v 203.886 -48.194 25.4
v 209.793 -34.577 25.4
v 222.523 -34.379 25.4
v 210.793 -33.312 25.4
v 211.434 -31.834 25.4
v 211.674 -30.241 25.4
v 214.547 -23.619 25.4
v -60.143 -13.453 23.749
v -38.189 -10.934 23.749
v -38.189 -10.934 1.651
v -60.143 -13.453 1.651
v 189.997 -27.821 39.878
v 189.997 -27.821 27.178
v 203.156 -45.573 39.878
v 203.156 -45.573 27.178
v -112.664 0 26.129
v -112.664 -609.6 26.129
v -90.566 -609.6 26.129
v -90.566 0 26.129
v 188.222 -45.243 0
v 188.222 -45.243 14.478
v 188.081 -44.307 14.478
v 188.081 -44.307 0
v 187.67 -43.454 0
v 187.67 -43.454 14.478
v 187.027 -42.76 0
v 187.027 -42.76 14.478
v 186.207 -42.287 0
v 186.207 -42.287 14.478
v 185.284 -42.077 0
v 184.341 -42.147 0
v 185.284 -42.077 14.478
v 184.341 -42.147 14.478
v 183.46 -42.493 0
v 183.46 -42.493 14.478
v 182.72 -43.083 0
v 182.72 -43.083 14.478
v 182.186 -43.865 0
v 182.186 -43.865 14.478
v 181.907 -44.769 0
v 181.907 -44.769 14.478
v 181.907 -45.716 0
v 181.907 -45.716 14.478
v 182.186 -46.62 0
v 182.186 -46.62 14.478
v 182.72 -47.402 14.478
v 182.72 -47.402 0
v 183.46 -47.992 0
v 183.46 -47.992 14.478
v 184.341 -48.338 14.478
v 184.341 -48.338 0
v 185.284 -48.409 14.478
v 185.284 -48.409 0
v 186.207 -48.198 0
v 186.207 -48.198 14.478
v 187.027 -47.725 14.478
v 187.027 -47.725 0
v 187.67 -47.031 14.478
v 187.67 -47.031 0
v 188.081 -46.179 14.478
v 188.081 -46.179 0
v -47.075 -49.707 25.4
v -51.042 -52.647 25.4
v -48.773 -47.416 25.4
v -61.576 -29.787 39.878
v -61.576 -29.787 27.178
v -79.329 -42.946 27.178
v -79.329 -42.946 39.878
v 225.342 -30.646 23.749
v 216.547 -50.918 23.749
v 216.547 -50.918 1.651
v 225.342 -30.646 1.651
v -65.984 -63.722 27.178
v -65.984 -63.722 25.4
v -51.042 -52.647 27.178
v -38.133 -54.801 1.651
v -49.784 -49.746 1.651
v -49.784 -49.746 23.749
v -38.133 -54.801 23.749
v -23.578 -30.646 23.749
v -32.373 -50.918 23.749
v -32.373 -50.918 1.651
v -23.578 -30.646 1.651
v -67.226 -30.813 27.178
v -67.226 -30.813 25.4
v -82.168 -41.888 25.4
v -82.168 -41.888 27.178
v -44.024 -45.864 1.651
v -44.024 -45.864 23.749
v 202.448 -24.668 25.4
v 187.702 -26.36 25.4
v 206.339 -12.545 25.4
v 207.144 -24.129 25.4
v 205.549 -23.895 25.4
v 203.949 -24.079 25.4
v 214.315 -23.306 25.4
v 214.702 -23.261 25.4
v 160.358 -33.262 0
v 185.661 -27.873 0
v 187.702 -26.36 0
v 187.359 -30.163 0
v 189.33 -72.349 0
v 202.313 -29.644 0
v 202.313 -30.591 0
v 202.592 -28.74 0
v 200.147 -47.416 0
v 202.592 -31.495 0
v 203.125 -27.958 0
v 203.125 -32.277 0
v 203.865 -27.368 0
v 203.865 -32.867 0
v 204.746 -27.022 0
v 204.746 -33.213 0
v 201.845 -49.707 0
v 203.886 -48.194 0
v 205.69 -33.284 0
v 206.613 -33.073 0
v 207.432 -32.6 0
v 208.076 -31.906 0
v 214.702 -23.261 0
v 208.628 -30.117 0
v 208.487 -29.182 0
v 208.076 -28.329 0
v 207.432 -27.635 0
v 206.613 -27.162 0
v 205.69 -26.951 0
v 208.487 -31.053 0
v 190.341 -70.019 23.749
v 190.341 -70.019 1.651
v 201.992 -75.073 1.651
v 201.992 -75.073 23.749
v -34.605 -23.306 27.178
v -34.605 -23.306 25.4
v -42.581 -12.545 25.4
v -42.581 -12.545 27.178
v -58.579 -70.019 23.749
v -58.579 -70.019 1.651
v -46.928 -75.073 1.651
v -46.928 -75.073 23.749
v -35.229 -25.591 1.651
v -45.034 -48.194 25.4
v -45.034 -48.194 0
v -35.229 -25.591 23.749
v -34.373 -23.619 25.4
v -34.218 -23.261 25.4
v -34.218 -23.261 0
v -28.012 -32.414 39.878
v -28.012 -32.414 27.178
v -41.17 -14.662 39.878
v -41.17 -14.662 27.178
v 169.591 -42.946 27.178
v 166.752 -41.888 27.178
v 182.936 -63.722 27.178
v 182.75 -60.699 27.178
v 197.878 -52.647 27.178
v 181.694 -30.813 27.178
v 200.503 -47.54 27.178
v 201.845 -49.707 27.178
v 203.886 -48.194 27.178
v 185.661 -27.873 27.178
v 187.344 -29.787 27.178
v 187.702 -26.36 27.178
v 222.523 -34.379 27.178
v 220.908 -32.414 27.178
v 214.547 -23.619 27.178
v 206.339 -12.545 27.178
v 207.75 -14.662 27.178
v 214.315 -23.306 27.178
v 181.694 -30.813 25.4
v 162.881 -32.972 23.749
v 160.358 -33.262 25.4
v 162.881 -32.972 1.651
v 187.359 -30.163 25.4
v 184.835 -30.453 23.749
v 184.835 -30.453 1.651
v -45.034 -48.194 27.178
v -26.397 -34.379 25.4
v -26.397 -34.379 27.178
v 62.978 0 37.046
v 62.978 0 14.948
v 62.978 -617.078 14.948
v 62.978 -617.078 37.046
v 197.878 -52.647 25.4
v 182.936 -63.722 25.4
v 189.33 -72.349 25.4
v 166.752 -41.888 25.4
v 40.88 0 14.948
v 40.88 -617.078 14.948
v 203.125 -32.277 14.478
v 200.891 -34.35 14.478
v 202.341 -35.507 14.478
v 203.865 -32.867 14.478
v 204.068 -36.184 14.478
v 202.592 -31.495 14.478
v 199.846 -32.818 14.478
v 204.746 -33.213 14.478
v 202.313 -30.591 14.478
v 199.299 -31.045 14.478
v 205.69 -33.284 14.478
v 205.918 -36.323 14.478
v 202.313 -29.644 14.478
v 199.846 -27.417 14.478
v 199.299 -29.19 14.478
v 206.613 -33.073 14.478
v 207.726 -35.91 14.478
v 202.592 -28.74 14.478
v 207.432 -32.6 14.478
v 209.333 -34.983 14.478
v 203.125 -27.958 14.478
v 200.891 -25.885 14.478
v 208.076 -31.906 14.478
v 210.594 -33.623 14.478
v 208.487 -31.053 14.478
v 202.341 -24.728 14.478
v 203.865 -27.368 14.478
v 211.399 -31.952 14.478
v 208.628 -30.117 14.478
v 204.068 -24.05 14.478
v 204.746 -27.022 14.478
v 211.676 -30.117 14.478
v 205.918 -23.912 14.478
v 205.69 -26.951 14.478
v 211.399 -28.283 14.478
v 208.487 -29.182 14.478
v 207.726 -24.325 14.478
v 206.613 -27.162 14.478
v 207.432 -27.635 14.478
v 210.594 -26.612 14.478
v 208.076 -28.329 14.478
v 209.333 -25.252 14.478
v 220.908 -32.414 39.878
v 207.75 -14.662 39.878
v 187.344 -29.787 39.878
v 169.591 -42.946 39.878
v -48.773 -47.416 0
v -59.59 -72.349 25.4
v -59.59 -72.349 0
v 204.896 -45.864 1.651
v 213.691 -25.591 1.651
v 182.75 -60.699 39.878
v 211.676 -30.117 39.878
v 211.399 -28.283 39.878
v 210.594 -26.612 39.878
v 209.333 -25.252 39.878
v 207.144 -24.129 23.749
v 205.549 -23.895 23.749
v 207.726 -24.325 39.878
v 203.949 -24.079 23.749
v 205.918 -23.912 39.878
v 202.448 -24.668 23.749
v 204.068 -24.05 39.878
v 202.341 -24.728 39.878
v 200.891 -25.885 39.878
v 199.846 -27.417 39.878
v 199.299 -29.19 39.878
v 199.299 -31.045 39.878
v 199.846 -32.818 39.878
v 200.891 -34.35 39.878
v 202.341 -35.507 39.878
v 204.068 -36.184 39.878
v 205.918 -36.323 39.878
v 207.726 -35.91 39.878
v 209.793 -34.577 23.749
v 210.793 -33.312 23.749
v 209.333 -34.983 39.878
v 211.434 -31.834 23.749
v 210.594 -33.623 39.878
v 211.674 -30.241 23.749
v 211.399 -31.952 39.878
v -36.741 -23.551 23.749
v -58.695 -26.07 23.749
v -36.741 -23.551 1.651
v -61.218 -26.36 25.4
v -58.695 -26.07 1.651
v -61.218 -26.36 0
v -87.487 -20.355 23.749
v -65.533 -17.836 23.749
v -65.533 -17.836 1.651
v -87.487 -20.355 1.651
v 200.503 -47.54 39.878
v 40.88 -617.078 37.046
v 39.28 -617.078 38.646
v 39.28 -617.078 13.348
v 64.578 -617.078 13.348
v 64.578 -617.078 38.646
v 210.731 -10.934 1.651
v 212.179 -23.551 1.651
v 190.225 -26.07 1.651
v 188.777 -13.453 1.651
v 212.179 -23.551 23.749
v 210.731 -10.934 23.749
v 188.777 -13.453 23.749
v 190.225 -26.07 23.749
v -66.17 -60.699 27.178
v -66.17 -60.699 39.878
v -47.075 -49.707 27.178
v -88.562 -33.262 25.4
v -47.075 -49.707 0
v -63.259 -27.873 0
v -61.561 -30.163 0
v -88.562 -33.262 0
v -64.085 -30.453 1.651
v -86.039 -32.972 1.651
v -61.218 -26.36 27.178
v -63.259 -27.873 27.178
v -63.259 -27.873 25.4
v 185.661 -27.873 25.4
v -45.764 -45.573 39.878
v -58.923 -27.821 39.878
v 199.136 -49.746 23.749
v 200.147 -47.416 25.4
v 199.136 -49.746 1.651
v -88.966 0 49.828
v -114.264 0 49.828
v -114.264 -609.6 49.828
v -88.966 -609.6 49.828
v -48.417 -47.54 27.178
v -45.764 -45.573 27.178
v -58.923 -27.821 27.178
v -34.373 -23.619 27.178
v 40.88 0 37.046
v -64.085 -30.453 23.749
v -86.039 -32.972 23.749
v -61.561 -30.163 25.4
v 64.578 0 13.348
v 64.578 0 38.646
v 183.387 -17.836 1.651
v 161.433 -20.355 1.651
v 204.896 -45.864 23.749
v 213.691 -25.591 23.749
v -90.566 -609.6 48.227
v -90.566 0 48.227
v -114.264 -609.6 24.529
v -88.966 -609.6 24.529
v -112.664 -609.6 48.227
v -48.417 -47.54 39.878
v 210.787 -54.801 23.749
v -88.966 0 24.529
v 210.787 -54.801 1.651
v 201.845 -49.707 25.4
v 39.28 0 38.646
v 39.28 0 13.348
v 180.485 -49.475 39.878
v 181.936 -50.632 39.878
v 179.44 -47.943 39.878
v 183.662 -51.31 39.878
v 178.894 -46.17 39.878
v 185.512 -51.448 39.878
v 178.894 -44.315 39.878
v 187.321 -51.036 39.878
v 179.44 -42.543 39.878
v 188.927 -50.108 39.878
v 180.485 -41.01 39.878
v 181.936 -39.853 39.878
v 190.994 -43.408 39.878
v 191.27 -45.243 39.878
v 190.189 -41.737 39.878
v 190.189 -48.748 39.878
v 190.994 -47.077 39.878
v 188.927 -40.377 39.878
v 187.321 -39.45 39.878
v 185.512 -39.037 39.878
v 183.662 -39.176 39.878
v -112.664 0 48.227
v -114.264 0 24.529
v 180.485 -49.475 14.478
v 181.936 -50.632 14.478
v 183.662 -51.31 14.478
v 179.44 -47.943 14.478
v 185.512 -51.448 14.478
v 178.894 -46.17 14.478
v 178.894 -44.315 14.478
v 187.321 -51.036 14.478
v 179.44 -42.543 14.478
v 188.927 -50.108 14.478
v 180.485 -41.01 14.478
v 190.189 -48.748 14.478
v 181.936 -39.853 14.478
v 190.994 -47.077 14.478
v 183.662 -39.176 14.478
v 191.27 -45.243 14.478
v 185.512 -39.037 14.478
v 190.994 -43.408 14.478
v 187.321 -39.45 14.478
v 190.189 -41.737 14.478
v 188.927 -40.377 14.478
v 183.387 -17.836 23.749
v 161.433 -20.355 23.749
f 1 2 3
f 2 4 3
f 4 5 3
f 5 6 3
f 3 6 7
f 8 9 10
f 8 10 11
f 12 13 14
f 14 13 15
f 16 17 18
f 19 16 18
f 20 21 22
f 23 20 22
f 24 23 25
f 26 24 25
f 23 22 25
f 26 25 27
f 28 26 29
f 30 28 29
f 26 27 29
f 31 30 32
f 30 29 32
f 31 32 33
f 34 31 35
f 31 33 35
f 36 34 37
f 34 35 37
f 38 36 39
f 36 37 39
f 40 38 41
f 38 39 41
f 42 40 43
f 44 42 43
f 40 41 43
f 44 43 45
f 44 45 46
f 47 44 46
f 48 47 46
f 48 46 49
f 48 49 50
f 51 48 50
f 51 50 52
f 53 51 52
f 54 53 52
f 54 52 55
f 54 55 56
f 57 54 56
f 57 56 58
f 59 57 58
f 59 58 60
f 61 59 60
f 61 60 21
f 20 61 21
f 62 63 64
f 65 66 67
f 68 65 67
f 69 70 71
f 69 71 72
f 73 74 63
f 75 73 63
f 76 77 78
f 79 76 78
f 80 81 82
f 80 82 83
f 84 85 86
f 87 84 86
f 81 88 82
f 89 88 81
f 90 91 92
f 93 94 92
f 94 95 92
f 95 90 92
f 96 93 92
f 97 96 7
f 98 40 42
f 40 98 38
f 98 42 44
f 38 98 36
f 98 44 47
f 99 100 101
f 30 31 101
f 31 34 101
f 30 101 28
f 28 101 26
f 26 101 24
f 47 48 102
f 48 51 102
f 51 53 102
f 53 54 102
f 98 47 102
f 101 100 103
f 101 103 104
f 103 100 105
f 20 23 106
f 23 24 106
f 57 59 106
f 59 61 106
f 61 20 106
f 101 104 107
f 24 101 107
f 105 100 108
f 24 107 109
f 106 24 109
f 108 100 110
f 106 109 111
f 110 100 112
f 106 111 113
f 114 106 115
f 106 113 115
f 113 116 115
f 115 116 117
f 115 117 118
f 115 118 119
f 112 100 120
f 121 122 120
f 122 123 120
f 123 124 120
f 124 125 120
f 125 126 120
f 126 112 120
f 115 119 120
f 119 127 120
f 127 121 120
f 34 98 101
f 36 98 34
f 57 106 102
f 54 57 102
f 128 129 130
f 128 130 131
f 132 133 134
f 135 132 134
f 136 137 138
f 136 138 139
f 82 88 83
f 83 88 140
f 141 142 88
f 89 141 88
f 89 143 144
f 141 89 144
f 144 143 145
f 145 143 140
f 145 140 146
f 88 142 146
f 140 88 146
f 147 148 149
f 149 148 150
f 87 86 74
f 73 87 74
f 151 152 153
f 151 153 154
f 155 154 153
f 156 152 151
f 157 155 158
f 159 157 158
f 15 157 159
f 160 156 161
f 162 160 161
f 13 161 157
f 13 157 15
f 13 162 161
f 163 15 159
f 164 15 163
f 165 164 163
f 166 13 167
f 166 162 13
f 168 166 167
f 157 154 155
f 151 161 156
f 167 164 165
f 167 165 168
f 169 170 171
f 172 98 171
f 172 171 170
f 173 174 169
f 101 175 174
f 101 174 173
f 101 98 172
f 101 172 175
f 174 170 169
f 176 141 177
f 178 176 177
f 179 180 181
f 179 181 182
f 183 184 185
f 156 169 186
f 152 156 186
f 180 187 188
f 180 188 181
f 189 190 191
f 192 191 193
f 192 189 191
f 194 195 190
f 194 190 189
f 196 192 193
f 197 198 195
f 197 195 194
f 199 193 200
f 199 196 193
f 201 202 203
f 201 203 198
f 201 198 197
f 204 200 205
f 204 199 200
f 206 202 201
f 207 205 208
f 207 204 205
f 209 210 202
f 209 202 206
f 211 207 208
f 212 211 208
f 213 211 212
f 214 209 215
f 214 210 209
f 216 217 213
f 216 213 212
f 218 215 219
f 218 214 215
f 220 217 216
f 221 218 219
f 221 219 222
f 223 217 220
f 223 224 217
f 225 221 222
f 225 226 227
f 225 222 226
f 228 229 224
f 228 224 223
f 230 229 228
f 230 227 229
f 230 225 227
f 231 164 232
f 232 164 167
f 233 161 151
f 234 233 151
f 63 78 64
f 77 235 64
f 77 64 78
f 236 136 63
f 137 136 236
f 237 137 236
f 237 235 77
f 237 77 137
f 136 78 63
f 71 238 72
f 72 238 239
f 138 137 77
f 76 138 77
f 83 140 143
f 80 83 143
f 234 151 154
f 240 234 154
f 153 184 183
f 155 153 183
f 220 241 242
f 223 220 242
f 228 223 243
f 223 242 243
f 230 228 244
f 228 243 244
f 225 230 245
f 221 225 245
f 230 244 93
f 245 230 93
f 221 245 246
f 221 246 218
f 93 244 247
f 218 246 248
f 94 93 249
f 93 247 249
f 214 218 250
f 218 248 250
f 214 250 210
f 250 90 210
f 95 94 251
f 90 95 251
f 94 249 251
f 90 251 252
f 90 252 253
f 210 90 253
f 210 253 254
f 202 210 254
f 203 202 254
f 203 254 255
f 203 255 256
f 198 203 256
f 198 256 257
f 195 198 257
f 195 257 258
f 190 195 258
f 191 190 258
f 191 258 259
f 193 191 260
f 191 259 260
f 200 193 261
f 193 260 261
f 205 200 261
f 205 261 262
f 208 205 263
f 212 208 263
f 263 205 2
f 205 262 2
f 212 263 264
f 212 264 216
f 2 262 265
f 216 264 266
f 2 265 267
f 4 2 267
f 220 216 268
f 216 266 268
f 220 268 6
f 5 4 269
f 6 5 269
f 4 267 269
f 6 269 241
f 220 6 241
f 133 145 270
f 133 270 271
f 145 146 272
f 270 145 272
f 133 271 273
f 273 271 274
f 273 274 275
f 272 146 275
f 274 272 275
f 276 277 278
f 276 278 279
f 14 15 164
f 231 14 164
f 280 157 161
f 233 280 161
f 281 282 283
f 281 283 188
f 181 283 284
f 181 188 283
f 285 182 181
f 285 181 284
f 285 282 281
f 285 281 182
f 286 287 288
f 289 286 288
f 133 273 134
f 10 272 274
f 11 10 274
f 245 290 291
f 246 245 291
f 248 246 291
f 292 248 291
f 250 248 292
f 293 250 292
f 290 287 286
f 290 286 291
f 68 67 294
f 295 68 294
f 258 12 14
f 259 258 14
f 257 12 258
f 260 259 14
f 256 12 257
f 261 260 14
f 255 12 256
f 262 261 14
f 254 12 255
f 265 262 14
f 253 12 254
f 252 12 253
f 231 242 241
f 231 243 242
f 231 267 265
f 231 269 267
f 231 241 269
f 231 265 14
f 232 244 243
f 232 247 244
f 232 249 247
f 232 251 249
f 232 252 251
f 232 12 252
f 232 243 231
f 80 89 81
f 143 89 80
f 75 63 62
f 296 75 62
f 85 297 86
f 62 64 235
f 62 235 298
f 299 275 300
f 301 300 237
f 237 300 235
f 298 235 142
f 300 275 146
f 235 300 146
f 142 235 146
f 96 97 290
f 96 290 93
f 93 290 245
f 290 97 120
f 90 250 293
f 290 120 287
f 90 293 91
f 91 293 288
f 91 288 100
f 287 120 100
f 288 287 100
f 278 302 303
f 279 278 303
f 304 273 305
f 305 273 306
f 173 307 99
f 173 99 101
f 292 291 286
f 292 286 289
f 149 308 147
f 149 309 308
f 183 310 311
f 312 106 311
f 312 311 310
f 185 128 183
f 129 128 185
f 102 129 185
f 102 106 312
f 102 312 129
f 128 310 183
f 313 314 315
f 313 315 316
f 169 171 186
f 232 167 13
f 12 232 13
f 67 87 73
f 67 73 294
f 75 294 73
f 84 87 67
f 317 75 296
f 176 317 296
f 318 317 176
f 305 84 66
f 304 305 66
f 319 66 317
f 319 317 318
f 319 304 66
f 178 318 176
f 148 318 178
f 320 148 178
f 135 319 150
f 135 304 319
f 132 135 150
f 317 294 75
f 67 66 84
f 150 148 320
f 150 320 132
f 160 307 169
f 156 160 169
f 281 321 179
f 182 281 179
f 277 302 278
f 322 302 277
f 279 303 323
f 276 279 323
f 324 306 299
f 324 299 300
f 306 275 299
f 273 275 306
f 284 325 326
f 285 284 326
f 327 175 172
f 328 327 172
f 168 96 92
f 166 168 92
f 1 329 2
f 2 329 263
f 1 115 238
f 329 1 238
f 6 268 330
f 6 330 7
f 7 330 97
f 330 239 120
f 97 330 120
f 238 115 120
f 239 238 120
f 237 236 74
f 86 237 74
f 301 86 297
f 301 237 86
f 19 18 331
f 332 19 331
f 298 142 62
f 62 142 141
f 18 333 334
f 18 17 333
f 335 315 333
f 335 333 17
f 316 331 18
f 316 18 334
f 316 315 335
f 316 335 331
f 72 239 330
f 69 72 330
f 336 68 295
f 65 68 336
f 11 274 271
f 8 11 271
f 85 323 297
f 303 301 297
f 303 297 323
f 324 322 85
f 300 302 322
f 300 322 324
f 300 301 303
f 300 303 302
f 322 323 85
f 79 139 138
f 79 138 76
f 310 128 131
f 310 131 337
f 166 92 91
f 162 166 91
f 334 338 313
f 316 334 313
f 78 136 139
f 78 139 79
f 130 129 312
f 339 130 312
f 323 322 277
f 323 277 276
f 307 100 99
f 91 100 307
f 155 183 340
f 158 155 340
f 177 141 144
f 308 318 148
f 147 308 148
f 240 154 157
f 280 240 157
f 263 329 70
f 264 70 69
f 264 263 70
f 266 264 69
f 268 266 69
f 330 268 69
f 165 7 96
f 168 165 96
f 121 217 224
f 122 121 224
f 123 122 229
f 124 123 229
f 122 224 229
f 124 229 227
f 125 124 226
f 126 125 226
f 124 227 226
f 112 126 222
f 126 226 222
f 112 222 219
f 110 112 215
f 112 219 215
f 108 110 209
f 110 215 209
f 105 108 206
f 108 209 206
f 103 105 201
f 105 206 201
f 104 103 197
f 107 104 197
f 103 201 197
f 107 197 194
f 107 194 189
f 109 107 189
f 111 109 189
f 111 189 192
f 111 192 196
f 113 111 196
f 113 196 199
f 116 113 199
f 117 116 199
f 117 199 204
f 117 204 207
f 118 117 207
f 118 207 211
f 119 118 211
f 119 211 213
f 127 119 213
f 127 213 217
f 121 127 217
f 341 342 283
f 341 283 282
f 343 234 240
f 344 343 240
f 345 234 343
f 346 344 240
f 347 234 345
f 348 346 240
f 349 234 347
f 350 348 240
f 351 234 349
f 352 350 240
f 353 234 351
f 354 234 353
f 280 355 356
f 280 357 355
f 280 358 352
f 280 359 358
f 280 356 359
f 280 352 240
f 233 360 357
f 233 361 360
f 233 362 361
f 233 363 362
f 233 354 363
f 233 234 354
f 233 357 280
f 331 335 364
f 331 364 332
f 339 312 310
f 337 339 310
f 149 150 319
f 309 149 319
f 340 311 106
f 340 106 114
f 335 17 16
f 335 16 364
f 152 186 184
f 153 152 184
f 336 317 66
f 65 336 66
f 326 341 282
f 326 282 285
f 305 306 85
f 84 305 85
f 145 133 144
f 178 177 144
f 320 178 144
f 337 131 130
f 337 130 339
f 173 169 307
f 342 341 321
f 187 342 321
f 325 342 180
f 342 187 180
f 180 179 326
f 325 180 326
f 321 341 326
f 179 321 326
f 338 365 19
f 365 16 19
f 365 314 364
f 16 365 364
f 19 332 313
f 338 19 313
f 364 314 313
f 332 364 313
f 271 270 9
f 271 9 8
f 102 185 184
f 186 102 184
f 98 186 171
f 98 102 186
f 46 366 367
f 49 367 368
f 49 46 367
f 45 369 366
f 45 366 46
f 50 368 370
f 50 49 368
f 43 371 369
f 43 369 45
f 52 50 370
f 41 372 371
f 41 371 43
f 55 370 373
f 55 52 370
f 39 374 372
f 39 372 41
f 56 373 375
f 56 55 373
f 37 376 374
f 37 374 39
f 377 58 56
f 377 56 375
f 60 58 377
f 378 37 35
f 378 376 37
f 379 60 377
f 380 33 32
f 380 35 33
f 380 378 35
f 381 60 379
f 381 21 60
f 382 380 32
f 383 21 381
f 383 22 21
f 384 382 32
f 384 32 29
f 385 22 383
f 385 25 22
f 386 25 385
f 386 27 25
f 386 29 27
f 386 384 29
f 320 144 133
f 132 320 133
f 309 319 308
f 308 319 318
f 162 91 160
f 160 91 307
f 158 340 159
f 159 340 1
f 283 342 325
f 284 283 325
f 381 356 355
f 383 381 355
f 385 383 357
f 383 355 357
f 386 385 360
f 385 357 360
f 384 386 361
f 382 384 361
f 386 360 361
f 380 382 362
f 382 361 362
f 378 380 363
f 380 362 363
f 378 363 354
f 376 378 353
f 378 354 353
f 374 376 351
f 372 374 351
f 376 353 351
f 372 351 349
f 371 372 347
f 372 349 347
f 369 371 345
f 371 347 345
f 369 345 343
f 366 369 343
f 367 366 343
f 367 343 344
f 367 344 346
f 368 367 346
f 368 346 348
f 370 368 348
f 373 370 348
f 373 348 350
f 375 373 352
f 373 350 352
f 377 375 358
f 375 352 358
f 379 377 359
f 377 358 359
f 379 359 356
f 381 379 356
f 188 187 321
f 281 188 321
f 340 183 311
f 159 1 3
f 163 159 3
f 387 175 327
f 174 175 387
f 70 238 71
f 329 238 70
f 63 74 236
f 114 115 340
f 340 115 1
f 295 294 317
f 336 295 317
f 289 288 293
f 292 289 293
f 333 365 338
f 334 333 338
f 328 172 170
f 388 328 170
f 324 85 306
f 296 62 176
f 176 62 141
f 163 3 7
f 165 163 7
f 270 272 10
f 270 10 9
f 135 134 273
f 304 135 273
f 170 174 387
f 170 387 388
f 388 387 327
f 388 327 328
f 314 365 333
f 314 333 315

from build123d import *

# Parameters (mm, degrees)
F0_W      = 25.2984
F0_H      = 25.2984
F0_W_2    = 22.098
F0_H_2    = 22.098
F1_DEPTH  = 609.6
F3_DEPTH  = 25.4
F4_W      = 22.098
F4_H      = 22.098
F5_DEPTH  = 12.7
F6_W      = 22.098
F6_H      = 22.098
F7_DEPTH  = 12.7
F8_W      = 27.178
F8_H      = 25.4
F9_DEPTH  = 2.54
F11_DEPTH = 25.4
F13_W     = 22.098
F13_H     = 22.098
F14_DEPTH = 12.7
F15_W     = 22.098
F15_H     = 22.098
F16_DEPTH = 12.7
F18_DEPTH = 1.778
F20_DEPTH = 12.7
F22_R     = 3.175
F23_R     = 3.175
F24_DEPTH = 50.8
F26_R     = 6.223
F26_R_2   = 3.175
F25_R     = 6.223
F25_R_2   = 3.175
F27_DEPTH = 25.4
F28_W     = 25.2984
F28_H     = 25.2984
F28_W_2   = 22.098
F28_H_2   = 22.098
F29_DEPTH = 617.07776


with BuildPart() as f1:
    # F0 (on Front) → F1 (new body)
    with BuildSketch(Plane.XZ):
        with Locations((-101.6152944864, 37.1784642637)):
            Rectangle(F0_W, F0_H)
        with Locations((-101.6152944864, 37.1784642637)):
            Rectangle(F0_W_2, F0_H_2, mode=Mode.SUBTRACT)
    extrude(amount=F1_DEPTH)


with BuildPart() as f3:
    # F2 (on Top) → F3 (new body)
    with BuildSketch(Plane.XY):
        Polygon((-34.21769673, -23.2612590617), (-61.2184605644, -26.3600388792), (-45.0344566045, -48.1939963727), align=None)
    extrude(amount=F3_DEPTH)

    # F4 (on face) → F5 (join)
    with BuildSketch(Plane(origin=(2.1900719944, -19.082871383, 0), x_dir=(-0.9934786899, -0.114017949, 0), z_dir=(-0.114017949, 0.9934786899, 0))):
        with Locations((50.2357535681, 12.7)):
            Rectangle(F4_W, F4_H)
    extrude(amount=F5_DEPTH)

    # F6 (on face) → F7 (join)
    with BuildSketch(Plane(origin=(-20.3044777856, 8.808846692, 0), x_dir=(0.3979969046, 0.9173867581, 0), z_dir=(0.9173867581, -0.3979969046, 0))):
        with Locations((-48.5471084221, 12.7)):
            Rectangle(F6_W, F6_H)
    extrude(amount=F7_DEPTH)

    # F8 (on face) → F9 (join)
    with BuildSketch(Plane(origin=(-52.1209011583, -38.6336224658, 0), x_dir=(0.5954817853, -0.8033688091, 0), z_dir=(-0.8033688091, -0.5954817853, 0))):
        with Locations((-1.688645146, 12.7)):
            Rectangle(F8_W, F8_H)
    extrude(amount=F9_DEPTH)


with BuildPart() as f11:
    # F10 (on face) → F11 (new body)
    with BuildSketch(Plane(origin=(0, 0, 0), x_dir=(1, 0, 0), z_dir=(0, 0, -1))):
        Polygon((-88.5619732819, 33.2618674112), (-61.5612094474, 30.1630875938), (-48.7728212717, 47.4159951272), (-59.5895811463, 72.3487324381), align=None)
    extrude(amount=-F11_DEPTH)


with BuildPart() as f3_1:
    add(f3.part)

    # F12: union F11
    add(f11.part)

    # F13 (on face) → F14 (join)
    with BuildSketch(Plane(origin=(2.6164042983, -22.7976554369, 0), x_dir=(-0.9934786899, -0.114017949, 0), z_dir=(-0.114017949, 0.9934786899, 0))):
        with Locations((78.1878830937, 12.7)):
            Rectangle(F13_W, F13_H)
    extrude(amount=F14_DEPTH)

    # F15 (on face) → F16 (join)
    with BuildSketch(Plane(origin=(-23.7347412977, 10.2970241133, 0), x_dir=(0.3979969046, 0.9173867581, 0), z_dir=(0.9173867581, -0.3979969046, 0))):
        with Locations((-76.4992379477, 12.7)):
            Rectangle(F15_W, F15_H)
    extrude(amount=F16_DEPTH)

    # F17 (on face) → F18 (join)
    with BuildSketch(Plane.XY.offset(25.4)):
        Polygon((-82.167779194, -41.8883211779), (-65.9837752341, -63.7222786714), (-51.0423190211, -52.6472096378), (-48.7728212717, -47.4159951272), (-47.0750133796, -49.7065201072), (-45.0344566045, -48.1939963727), (-34.3728819471, -23.6189625051), (-34.6050696075, -23.3057164431), (-61.2184605644, -26.3600388792), (-63.2590173395, -27.8725626138), (-61.5612094474, -30.1630875938), (-67.2263229809, -30.8132521443), align=None)
        Polygon((-34.3728819471, -23.6189625051), (-45.0344566045, -48.1939963727), (-26.3969737974, -34.3793182208), align=None)
        Polygon((-42.5809777572, -12.5453607273), (-61.2184605644, -26.3600388792), (-34.6050696075, -23.3057164431), align=None)
        Polygon((-63.2590173395, -27.8725626138), (-67.2263229809, -30.8132521443), (-61.5612094474, -30.1630875938), align=None)
        Polygon((-48.7728212717, -47.4159951272), (-51.0423190211, -52.6472096378), (-47.0750133796, -49.7065201072), align=None)
    extrude(amount=F18_DEPTH)

    # F19 (on face) → F20 (join)
    with BuildSketch(Plane.XY.offset(27.178)):
        Polygon((-66.1699370649, -60.6985814689), (-48.4170931216, -47.5396249781), (-61.5760496123, -29.7867810348), (-79.3288935556, -42.9457375256), align=None)
        Polygon((-45.764369314, -45.5733441232), (-28.0115253707, -32.4143876325), (-41.1704818614, -14.6615436892), (-58.9233258047, -27.8205001799), align=None)
    extrude(amount=F20_DEPTH)


with BuildPart() as f21_1:
    # F21: copy of F3
    add(f3_1.part.moved(Location((248.92, 0, 0))))

    # F22 (on face) + F23 (on face) → F24 (cut)
    with BuildSketch(Plane.XY.offset(39.878)):
        with Locations((205.4525744123, -30.1174439062)):
            Circle(F22_R)
    with BuildSketch(Plane.XY.offset(39.878)):
        with Locations((185.0470066614, -45.2426812518)):
            Circle(F23_R)
    extrude(amount=-F24_DEPTH, mode=Mode.SUBTRACT)

    # F26 (on face) + F25 (on face) → F27 (cut)
    with BuildSketch(Plane.XY.offset(39.878)):
        with Locations((185.0470066614, -45.2426812518)):
            Circle(F26_R)
        with Locations((185.0470066614, -45.2426812518)):
            Circle(F26_R_2, mode=Mode.SUBTRACT)
    with BuildSketch(Plane.XY.offset(39.878)):
        with Locations((205.4525744123, -30.1174439062)):
            Circle(F25_R)
        with Locations((205.4525744123, -30.1174439062)):
            Circle(F25_R_2, mode=Mode.SUBTRACT)
    extrude(amount=-F27_DEPTH, mode=Mode.SUBTRACT)


with BuildPart() as f29:
    # F28 (on Front) → F29 (new body)
    with BuildSketch(Plane.XZ):
        with Locations((51.9292559475, 25.9970645619)):
            Rectangle(F28_W, F28_H)
        with Locations((51.9292559475, 25.9970645619)):
            Rectangle(F28_W_2, F28_H_2, mode=Mode.SUBTRACT)
    extrude(amount=F29_DEPTH)


solid = Compound([f1.part, f3_1.part, f21_1.part, f29.part])
